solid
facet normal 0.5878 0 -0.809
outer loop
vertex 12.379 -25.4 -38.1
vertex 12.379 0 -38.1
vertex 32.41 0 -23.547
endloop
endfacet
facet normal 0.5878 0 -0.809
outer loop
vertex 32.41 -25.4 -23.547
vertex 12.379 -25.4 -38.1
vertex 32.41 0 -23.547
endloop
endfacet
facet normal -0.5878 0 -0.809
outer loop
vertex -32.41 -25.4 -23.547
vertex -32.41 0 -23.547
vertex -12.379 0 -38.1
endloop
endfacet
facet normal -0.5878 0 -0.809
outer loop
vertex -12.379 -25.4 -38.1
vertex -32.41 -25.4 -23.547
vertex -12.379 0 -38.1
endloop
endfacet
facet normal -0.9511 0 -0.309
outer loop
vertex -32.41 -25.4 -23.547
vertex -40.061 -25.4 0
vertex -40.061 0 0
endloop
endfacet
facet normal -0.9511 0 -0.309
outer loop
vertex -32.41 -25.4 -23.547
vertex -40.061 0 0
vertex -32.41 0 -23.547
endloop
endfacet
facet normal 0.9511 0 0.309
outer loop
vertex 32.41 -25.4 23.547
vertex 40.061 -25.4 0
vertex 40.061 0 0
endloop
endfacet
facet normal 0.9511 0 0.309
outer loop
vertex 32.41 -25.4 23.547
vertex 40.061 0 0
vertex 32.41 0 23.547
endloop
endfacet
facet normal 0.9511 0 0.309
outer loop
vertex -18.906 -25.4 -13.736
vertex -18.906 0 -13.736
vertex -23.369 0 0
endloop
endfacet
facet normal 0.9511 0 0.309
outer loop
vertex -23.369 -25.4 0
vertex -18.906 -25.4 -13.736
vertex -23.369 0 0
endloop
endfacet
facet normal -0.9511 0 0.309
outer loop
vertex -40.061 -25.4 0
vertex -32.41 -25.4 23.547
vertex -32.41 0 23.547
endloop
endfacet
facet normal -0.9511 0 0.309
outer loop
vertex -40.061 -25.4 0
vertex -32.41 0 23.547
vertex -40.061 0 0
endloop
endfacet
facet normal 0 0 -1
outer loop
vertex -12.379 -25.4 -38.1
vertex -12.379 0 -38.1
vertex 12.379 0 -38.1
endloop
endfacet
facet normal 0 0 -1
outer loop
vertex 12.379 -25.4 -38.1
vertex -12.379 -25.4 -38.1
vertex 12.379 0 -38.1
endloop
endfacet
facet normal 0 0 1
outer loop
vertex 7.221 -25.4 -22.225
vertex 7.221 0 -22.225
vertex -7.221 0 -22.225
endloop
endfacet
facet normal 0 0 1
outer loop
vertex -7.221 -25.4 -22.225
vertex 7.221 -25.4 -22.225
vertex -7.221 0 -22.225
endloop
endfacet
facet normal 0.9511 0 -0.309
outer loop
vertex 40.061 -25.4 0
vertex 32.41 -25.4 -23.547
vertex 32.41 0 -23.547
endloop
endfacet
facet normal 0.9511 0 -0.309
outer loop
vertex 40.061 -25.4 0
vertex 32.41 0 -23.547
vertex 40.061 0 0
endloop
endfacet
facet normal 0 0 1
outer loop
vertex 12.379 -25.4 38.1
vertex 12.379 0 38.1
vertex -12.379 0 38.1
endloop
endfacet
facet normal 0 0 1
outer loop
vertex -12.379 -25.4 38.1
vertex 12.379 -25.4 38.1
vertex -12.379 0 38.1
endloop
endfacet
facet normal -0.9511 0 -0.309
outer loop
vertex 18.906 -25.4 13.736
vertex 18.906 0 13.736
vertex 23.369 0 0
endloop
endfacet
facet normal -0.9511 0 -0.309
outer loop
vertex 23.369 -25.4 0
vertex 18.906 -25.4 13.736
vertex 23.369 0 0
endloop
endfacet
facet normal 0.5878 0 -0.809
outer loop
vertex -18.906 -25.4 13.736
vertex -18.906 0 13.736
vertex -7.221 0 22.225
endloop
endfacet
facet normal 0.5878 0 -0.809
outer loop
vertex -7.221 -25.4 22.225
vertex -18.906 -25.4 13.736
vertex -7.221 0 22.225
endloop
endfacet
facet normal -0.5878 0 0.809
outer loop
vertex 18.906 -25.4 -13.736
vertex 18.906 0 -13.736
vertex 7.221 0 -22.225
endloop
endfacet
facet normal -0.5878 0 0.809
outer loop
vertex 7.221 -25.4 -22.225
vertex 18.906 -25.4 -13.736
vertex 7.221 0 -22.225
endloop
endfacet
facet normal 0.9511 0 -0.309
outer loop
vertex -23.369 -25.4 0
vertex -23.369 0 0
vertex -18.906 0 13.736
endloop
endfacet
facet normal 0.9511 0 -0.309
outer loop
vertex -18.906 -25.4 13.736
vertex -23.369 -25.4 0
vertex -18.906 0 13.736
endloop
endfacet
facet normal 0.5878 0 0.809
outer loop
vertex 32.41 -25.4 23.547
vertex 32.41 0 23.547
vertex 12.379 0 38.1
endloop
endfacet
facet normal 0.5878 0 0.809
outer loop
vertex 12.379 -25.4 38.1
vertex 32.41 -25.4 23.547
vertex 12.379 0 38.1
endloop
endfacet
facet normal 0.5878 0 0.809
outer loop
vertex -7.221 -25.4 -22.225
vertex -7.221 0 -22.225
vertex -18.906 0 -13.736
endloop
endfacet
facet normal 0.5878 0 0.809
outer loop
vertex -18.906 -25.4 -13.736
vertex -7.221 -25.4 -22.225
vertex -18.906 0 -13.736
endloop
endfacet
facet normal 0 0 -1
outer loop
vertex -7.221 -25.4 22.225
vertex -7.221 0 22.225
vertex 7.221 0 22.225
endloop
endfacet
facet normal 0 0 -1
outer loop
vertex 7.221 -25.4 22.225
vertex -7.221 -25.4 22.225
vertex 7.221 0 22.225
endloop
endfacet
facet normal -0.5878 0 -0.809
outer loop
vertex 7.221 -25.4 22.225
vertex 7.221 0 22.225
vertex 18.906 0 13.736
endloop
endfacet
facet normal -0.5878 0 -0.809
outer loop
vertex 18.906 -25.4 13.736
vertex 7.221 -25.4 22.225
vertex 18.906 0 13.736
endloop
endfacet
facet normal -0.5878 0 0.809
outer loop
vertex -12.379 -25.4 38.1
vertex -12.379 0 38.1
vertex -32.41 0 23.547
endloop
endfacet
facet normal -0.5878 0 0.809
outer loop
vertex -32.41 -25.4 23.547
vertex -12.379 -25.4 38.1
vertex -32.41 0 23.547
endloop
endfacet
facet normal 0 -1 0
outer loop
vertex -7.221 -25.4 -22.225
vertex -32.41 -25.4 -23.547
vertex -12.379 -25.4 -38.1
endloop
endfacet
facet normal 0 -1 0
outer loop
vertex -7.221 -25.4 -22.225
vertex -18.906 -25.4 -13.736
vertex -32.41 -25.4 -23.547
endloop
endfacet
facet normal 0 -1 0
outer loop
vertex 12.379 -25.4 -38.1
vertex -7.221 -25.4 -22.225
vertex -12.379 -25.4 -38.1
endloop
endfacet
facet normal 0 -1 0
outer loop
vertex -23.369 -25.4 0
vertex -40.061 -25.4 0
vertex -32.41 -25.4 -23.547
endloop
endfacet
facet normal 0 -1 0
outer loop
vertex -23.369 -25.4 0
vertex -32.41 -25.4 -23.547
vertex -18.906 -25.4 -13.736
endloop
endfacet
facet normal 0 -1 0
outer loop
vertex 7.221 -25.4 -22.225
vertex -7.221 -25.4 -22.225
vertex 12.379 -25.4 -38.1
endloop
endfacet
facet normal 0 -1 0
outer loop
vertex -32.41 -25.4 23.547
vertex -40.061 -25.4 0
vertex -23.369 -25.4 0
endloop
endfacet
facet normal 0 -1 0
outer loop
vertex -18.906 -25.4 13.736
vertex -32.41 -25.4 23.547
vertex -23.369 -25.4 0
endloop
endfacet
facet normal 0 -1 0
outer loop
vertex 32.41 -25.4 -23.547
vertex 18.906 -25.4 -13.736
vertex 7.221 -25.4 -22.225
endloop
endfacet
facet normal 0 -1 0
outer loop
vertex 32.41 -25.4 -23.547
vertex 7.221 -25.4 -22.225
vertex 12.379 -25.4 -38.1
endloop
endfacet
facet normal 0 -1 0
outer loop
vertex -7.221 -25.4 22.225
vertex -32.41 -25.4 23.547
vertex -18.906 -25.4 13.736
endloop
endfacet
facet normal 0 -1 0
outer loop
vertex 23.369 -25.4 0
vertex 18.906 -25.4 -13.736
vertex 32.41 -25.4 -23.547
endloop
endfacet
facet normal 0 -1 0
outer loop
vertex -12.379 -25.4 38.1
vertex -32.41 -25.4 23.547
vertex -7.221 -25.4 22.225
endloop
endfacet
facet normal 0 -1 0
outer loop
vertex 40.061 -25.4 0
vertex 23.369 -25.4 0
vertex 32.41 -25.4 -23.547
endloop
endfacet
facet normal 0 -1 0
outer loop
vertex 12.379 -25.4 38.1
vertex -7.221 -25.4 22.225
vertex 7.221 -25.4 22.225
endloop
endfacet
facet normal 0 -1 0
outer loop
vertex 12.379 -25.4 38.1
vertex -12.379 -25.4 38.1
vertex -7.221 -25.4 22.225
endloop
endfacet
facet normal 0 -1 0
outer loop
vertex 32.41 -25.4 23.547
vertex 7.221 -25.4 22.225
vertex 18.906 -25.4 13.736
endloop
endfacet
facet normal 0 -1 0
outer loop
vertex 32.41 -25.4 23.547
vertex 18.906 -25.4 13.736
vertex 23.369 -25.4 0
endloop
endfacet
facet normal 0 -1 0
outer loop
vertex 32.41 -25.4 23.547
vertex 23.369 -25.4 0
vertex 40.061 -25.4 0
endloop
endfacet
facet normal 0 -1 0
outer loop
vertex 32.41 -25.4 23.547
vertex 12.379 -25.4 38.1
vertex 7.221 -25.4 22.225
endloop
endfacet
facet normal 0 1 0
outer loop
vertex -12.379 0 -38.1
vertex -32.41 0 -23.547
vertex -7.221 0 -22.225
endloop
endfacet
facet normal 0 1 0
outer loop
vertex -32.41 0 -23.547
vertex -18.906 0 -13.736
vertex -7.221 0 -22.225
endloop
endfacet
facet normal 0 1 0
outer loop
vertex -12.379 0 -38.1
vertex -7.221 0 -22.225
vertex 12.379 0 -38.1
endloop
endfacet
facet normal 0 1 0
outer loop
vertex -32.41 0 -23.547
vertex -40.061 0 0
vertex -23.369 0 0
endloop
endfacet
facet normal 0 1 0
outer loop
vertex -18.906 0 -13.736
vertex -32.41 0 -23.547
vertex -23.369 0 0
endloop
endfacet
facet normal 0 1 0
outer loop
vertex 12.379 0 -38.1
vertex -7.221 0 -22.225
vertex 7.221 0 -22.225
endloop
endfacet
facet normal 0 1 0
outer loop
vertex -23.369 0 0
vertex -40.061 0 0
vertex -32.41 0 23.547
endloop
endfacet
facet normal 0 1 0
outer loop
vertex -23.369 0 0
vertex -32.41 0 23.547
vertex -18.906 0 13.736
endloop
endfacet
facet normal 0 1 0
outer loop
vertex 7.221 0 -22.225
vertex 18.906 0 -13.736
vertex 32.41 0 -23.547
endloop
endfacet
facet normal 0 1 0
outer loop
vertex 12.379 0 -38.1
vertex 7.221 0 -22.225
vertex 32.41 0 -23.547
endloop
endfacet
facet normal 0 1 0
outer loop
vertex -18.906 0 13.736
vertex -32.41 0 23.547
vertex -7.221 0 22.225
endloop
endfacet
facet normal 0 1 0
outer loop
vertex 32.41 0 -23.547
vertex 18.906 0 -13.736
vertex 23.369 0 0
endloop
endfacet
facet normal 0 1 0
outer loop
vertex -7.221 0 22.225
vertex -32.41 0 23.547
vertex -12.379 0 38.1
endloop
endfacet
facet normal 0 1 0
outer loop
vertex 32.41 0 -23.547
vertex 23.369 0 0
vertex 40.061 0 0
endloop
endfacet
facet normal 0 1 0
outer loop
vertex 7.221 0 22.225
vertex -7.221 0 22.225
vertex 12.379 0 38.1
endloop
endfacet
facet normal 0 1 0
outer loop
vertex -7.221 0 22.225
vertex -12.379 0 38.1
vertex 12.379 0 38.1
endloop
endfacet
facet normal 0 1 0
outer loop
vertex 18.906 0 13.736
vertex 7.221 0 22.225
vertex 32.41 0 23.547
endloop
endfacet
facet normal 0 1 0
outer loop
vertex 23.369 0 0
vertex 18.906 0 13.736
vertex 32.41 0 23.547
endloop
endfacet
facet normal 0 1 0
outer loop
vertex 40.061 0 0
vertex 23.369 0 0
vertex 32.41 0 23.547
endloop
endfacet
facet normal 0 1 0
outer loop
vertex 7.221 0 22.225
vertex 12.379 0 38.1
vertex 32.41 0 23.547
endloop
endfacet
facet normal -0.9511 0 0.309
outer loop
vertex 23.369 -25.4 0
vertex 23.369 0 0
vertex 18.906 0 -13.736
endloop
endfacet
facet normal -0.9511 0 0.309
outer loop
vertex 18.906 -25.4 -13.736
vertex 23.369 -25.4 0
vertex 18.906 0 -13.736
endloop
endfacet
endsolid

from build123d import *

# Parameters (mm, degrees)
F1_DEPTH = 25.4


with BuildPart() as f1:
    # F0 (on Front) → F1 (new body)
    with BuildSketch(Plane.XZ):
        Polygon((12.37944, 38.1), (0, 38.1), (-12.37944, 38.1), (-32.409796, 23.547095), (-40.060711, 0), (-32.409796, -23.547095), (-12.37944, -38.1), (12.37944, -38.1), (32.409796, -23.547095), (40.060711, 0), (32.409796, 23.547095), align=None)
        Polygon((-7.22134, 22.225), (0, 22.225), (7.22134, 22.225), (18.905714, 13.735805), (23.368748, 0), (18.905714, -13.735805), (7.22134, -22.225), (-7.22134, -22.225), (-18.905714, -13.735805), (-23.368748, 0), (-18.905714, 13.735805), align=None, mode=Mode.SUBTRACT)
    extrude(amount=F1_DEPTH)


solid = f1.part
